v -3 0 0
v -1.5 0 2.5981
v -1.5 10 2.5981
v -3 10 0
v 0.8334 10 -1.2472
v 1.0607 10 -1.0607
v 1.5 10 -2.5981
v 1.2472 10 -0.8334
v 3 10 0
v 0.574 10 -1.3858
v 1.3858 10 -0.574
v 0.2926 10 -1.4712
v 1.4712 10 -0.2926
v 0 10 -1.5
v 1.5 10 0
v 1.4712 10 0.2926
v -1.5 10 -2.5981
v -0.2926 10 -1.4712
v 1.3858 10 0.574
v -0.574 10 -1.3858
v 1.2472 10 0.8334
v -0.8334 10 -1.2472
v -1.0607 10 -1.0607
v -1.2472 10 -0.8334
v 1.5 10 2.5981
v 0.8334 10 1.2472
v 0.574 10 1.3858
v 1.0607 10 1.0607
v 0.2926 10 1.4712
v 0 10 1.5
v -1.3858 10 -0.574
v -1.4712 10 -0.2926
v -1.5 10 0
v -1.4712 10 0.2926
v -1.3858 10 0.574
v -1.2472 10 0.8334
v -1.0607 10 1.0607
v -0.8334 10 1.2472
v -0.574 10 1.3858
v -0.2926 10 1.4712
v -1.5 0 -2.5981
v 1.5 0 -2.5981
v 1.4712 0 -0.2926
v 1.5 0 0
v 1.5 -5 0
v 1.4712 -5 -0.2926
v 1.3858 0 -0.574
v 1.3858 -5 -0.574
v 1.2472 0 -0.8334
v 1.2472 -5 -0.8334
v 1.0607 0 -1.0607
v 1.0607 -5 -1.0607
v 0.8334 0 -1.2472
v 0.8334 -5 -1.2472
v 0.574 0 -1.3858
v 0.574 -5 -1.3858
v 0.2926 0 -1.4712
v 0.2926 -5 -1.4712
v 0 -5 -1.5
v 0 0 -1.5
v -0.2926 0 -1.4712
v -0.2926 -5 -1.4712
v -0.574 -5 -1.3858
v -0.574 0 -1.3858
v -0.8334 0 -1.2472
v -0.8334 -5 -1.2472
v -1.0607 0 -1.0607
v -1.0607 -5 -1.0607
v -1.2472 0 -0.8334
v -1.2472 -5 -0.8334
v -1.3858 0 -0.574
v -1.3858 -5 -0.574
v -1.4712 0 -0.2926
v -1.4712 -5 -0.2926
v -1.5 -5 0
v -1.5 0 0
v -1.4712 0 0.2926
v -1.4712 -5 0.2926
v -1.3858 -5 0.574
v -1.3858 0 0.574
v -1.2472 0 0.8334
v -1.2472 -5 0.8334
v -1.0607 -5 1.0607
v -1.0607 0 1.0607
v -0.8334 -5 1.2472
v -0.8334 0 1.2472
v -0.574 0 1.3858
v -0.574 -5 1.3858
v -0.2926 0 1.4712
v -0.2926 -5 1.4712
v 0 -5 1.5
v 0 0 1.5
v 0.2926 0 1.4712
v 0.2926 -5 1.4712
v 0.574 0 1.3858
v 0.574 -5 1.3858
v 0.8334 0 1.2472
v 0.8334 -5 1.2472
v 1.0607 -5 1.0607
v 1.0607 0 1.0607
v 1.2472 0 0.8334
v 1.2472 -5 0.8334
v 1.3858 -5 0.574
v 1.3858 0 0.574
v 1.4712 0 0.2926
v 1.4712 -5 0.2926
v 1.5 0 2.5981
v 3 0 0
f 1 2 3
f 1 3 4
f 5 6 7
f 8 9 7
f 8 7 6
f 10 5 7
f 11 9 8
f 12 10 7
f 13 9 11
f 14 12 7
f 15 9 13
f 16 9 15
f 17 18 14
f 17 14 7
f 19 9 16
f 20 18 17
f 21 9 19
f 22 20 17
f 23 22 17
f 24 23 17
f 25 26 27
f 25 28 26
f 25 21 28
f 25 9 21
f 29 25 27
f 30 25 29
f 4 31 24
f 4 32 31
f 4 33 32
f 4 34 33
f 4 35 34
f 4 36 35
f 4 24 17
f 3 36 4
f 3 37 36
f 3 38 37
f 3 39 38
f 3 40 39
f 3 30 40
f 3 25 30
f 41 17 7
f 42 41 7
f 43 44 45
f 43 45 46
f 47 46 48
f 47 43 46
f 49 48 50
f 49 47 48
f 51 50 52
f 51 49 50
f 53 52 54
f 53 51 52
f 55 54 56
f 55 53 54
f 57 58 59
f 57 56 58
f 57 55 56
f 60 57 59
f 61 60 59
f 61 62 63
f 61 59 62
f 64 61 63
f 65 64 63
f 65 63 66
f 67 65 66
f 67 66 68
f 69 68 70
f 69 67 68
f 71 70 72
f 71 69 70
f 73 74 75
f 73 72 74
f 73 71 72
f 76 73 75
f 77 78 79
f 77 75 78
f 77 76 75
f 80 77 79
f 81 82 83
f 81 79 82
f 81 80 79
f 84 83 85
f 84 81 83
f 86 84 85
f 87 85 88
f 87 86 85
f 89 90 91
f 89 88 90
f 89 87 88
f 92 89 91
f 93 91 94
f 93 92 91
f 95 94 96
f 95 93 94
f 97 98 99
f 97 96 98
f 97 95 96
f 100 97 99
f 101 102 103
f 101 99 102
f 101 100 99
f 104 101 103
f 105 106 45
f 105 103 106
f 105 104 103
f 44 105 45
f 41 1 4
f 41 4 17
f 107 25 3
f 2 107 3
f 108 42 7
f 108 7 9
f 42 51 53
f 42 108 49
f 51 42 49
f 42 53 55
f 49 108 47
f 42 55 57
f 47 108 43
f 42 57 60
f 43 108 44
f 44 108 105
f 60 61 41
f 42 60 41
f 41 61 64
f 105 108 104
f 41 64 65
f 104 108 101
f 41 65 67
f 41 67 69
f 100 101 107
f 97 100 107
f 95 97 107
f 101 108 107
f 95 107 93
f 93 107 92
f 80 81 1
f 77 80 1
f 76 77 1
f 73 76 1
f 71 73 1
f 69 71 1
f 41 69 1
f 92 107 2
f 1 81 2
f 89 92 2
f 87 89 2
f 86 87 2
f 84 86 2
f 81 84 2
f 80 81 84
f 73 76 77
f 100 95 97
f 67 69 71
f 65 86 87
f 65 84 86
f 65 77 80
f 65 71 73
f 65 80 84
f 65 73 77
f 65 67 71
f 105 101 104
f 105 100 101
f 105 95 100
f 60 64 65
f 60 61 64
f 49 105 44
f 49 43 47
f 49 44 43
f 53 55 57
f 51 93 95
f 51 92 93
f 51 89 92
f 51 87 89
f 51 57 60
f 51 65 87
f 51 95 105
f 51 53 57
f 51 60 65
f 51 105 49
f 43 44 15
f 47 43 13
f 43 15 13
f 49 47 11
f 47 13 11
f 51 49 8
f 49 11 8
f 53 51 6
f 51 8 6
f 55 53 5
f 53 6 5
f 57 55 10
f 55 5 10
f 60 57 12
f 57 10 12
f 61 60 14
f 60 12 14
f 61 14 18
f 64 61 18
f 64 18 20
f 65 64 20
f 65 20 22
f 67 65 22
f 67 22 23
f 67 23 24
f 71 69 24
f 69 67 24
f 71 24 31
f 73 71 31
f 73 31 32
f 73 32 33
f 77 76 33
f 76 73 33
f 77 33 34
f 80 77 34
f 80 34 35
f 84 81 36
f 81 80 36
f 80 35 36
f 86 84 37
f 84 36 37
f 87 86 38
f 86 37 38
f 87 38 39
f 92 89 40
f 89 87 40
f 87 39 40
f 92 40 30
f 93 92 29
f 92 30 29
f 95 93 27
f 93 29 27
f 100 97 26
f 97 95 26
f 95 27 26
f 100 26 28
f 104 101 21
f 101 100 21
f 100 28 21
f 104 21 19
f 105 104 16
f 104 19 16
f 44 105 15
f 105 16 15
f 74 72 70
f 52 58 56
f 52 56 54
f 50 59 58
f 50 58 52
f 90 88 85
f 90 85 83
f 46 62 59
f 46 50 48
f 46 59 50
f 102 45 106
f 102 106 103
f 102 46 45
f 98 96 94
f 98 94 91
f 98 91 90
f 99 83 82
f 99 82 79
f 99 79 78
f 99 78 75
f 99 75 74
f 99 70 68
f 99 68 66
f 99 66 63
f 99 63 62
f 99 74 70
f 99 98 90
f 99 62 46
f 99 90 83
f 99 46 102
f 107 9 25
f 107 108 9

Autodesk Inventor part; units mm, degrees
ref_plane "YZ Plane" through (0, 0, 0) normal (1, 0, 0) x (0, 1, 0)
ref_plane "XZ Plane" through (0, 0, 0) normal (0, 1, 0) x (-1, 0, 0)
ref_plane "XY Plane" through (0, 0, 0) normal (0, 0, 1) x (1, 0, 0)
sketch "Sketch1" plane through (0, 0, 0) normal (0, 1, 0) x (-1, 0, 0)
  line L0 (-3, 0) -> (-1.5, 2.5981)
  line L1 (-1.5, 2.5981) -> (1.5, 2.5981)
  line L2 (1.5, 2.5981) -> (3, 0)
  line L3 (3, 0) -> (1.5, -2.5981)
  line L4 (1.5, -2.5981) -> (-1.5, -2.5981)
  line L5 (-1.5, -2.5981) -> (-3, 0)
  point P0 (0, 0)
  point P1 (0, 0)
  dimension "d0" = 6
sketch "Sketch2" plane through (0, 0, 0) normal (0, 1, 0) x (-1, 0, 0)
  point P0 (0, 0)
extrude "Extrusion1" add sketch "Sketch1" along normal blind 10
sketch "Sketch3" plane through (0, 0, 0) normal (0, -1, 0) x (1, 0, 0)
  circle A0 centre (0, 0) radius 1.5
  dimension "d3" = 3
sketch "Sketch4" plane through (0, 10, 0) normal (0, 1, 0) x (1, 0, 0)
  circle A0 centre (0, 0) radius 1.5
  dimension "d4" = 3
extrude "Extrusion2" add sketch "Sketch3" along normal blind 5
extrude "Extrusion3" cut sketch "Sketch4" against normal blind 10
properties part number "Spacer10mm" material "Brass, Soft Yellow"
